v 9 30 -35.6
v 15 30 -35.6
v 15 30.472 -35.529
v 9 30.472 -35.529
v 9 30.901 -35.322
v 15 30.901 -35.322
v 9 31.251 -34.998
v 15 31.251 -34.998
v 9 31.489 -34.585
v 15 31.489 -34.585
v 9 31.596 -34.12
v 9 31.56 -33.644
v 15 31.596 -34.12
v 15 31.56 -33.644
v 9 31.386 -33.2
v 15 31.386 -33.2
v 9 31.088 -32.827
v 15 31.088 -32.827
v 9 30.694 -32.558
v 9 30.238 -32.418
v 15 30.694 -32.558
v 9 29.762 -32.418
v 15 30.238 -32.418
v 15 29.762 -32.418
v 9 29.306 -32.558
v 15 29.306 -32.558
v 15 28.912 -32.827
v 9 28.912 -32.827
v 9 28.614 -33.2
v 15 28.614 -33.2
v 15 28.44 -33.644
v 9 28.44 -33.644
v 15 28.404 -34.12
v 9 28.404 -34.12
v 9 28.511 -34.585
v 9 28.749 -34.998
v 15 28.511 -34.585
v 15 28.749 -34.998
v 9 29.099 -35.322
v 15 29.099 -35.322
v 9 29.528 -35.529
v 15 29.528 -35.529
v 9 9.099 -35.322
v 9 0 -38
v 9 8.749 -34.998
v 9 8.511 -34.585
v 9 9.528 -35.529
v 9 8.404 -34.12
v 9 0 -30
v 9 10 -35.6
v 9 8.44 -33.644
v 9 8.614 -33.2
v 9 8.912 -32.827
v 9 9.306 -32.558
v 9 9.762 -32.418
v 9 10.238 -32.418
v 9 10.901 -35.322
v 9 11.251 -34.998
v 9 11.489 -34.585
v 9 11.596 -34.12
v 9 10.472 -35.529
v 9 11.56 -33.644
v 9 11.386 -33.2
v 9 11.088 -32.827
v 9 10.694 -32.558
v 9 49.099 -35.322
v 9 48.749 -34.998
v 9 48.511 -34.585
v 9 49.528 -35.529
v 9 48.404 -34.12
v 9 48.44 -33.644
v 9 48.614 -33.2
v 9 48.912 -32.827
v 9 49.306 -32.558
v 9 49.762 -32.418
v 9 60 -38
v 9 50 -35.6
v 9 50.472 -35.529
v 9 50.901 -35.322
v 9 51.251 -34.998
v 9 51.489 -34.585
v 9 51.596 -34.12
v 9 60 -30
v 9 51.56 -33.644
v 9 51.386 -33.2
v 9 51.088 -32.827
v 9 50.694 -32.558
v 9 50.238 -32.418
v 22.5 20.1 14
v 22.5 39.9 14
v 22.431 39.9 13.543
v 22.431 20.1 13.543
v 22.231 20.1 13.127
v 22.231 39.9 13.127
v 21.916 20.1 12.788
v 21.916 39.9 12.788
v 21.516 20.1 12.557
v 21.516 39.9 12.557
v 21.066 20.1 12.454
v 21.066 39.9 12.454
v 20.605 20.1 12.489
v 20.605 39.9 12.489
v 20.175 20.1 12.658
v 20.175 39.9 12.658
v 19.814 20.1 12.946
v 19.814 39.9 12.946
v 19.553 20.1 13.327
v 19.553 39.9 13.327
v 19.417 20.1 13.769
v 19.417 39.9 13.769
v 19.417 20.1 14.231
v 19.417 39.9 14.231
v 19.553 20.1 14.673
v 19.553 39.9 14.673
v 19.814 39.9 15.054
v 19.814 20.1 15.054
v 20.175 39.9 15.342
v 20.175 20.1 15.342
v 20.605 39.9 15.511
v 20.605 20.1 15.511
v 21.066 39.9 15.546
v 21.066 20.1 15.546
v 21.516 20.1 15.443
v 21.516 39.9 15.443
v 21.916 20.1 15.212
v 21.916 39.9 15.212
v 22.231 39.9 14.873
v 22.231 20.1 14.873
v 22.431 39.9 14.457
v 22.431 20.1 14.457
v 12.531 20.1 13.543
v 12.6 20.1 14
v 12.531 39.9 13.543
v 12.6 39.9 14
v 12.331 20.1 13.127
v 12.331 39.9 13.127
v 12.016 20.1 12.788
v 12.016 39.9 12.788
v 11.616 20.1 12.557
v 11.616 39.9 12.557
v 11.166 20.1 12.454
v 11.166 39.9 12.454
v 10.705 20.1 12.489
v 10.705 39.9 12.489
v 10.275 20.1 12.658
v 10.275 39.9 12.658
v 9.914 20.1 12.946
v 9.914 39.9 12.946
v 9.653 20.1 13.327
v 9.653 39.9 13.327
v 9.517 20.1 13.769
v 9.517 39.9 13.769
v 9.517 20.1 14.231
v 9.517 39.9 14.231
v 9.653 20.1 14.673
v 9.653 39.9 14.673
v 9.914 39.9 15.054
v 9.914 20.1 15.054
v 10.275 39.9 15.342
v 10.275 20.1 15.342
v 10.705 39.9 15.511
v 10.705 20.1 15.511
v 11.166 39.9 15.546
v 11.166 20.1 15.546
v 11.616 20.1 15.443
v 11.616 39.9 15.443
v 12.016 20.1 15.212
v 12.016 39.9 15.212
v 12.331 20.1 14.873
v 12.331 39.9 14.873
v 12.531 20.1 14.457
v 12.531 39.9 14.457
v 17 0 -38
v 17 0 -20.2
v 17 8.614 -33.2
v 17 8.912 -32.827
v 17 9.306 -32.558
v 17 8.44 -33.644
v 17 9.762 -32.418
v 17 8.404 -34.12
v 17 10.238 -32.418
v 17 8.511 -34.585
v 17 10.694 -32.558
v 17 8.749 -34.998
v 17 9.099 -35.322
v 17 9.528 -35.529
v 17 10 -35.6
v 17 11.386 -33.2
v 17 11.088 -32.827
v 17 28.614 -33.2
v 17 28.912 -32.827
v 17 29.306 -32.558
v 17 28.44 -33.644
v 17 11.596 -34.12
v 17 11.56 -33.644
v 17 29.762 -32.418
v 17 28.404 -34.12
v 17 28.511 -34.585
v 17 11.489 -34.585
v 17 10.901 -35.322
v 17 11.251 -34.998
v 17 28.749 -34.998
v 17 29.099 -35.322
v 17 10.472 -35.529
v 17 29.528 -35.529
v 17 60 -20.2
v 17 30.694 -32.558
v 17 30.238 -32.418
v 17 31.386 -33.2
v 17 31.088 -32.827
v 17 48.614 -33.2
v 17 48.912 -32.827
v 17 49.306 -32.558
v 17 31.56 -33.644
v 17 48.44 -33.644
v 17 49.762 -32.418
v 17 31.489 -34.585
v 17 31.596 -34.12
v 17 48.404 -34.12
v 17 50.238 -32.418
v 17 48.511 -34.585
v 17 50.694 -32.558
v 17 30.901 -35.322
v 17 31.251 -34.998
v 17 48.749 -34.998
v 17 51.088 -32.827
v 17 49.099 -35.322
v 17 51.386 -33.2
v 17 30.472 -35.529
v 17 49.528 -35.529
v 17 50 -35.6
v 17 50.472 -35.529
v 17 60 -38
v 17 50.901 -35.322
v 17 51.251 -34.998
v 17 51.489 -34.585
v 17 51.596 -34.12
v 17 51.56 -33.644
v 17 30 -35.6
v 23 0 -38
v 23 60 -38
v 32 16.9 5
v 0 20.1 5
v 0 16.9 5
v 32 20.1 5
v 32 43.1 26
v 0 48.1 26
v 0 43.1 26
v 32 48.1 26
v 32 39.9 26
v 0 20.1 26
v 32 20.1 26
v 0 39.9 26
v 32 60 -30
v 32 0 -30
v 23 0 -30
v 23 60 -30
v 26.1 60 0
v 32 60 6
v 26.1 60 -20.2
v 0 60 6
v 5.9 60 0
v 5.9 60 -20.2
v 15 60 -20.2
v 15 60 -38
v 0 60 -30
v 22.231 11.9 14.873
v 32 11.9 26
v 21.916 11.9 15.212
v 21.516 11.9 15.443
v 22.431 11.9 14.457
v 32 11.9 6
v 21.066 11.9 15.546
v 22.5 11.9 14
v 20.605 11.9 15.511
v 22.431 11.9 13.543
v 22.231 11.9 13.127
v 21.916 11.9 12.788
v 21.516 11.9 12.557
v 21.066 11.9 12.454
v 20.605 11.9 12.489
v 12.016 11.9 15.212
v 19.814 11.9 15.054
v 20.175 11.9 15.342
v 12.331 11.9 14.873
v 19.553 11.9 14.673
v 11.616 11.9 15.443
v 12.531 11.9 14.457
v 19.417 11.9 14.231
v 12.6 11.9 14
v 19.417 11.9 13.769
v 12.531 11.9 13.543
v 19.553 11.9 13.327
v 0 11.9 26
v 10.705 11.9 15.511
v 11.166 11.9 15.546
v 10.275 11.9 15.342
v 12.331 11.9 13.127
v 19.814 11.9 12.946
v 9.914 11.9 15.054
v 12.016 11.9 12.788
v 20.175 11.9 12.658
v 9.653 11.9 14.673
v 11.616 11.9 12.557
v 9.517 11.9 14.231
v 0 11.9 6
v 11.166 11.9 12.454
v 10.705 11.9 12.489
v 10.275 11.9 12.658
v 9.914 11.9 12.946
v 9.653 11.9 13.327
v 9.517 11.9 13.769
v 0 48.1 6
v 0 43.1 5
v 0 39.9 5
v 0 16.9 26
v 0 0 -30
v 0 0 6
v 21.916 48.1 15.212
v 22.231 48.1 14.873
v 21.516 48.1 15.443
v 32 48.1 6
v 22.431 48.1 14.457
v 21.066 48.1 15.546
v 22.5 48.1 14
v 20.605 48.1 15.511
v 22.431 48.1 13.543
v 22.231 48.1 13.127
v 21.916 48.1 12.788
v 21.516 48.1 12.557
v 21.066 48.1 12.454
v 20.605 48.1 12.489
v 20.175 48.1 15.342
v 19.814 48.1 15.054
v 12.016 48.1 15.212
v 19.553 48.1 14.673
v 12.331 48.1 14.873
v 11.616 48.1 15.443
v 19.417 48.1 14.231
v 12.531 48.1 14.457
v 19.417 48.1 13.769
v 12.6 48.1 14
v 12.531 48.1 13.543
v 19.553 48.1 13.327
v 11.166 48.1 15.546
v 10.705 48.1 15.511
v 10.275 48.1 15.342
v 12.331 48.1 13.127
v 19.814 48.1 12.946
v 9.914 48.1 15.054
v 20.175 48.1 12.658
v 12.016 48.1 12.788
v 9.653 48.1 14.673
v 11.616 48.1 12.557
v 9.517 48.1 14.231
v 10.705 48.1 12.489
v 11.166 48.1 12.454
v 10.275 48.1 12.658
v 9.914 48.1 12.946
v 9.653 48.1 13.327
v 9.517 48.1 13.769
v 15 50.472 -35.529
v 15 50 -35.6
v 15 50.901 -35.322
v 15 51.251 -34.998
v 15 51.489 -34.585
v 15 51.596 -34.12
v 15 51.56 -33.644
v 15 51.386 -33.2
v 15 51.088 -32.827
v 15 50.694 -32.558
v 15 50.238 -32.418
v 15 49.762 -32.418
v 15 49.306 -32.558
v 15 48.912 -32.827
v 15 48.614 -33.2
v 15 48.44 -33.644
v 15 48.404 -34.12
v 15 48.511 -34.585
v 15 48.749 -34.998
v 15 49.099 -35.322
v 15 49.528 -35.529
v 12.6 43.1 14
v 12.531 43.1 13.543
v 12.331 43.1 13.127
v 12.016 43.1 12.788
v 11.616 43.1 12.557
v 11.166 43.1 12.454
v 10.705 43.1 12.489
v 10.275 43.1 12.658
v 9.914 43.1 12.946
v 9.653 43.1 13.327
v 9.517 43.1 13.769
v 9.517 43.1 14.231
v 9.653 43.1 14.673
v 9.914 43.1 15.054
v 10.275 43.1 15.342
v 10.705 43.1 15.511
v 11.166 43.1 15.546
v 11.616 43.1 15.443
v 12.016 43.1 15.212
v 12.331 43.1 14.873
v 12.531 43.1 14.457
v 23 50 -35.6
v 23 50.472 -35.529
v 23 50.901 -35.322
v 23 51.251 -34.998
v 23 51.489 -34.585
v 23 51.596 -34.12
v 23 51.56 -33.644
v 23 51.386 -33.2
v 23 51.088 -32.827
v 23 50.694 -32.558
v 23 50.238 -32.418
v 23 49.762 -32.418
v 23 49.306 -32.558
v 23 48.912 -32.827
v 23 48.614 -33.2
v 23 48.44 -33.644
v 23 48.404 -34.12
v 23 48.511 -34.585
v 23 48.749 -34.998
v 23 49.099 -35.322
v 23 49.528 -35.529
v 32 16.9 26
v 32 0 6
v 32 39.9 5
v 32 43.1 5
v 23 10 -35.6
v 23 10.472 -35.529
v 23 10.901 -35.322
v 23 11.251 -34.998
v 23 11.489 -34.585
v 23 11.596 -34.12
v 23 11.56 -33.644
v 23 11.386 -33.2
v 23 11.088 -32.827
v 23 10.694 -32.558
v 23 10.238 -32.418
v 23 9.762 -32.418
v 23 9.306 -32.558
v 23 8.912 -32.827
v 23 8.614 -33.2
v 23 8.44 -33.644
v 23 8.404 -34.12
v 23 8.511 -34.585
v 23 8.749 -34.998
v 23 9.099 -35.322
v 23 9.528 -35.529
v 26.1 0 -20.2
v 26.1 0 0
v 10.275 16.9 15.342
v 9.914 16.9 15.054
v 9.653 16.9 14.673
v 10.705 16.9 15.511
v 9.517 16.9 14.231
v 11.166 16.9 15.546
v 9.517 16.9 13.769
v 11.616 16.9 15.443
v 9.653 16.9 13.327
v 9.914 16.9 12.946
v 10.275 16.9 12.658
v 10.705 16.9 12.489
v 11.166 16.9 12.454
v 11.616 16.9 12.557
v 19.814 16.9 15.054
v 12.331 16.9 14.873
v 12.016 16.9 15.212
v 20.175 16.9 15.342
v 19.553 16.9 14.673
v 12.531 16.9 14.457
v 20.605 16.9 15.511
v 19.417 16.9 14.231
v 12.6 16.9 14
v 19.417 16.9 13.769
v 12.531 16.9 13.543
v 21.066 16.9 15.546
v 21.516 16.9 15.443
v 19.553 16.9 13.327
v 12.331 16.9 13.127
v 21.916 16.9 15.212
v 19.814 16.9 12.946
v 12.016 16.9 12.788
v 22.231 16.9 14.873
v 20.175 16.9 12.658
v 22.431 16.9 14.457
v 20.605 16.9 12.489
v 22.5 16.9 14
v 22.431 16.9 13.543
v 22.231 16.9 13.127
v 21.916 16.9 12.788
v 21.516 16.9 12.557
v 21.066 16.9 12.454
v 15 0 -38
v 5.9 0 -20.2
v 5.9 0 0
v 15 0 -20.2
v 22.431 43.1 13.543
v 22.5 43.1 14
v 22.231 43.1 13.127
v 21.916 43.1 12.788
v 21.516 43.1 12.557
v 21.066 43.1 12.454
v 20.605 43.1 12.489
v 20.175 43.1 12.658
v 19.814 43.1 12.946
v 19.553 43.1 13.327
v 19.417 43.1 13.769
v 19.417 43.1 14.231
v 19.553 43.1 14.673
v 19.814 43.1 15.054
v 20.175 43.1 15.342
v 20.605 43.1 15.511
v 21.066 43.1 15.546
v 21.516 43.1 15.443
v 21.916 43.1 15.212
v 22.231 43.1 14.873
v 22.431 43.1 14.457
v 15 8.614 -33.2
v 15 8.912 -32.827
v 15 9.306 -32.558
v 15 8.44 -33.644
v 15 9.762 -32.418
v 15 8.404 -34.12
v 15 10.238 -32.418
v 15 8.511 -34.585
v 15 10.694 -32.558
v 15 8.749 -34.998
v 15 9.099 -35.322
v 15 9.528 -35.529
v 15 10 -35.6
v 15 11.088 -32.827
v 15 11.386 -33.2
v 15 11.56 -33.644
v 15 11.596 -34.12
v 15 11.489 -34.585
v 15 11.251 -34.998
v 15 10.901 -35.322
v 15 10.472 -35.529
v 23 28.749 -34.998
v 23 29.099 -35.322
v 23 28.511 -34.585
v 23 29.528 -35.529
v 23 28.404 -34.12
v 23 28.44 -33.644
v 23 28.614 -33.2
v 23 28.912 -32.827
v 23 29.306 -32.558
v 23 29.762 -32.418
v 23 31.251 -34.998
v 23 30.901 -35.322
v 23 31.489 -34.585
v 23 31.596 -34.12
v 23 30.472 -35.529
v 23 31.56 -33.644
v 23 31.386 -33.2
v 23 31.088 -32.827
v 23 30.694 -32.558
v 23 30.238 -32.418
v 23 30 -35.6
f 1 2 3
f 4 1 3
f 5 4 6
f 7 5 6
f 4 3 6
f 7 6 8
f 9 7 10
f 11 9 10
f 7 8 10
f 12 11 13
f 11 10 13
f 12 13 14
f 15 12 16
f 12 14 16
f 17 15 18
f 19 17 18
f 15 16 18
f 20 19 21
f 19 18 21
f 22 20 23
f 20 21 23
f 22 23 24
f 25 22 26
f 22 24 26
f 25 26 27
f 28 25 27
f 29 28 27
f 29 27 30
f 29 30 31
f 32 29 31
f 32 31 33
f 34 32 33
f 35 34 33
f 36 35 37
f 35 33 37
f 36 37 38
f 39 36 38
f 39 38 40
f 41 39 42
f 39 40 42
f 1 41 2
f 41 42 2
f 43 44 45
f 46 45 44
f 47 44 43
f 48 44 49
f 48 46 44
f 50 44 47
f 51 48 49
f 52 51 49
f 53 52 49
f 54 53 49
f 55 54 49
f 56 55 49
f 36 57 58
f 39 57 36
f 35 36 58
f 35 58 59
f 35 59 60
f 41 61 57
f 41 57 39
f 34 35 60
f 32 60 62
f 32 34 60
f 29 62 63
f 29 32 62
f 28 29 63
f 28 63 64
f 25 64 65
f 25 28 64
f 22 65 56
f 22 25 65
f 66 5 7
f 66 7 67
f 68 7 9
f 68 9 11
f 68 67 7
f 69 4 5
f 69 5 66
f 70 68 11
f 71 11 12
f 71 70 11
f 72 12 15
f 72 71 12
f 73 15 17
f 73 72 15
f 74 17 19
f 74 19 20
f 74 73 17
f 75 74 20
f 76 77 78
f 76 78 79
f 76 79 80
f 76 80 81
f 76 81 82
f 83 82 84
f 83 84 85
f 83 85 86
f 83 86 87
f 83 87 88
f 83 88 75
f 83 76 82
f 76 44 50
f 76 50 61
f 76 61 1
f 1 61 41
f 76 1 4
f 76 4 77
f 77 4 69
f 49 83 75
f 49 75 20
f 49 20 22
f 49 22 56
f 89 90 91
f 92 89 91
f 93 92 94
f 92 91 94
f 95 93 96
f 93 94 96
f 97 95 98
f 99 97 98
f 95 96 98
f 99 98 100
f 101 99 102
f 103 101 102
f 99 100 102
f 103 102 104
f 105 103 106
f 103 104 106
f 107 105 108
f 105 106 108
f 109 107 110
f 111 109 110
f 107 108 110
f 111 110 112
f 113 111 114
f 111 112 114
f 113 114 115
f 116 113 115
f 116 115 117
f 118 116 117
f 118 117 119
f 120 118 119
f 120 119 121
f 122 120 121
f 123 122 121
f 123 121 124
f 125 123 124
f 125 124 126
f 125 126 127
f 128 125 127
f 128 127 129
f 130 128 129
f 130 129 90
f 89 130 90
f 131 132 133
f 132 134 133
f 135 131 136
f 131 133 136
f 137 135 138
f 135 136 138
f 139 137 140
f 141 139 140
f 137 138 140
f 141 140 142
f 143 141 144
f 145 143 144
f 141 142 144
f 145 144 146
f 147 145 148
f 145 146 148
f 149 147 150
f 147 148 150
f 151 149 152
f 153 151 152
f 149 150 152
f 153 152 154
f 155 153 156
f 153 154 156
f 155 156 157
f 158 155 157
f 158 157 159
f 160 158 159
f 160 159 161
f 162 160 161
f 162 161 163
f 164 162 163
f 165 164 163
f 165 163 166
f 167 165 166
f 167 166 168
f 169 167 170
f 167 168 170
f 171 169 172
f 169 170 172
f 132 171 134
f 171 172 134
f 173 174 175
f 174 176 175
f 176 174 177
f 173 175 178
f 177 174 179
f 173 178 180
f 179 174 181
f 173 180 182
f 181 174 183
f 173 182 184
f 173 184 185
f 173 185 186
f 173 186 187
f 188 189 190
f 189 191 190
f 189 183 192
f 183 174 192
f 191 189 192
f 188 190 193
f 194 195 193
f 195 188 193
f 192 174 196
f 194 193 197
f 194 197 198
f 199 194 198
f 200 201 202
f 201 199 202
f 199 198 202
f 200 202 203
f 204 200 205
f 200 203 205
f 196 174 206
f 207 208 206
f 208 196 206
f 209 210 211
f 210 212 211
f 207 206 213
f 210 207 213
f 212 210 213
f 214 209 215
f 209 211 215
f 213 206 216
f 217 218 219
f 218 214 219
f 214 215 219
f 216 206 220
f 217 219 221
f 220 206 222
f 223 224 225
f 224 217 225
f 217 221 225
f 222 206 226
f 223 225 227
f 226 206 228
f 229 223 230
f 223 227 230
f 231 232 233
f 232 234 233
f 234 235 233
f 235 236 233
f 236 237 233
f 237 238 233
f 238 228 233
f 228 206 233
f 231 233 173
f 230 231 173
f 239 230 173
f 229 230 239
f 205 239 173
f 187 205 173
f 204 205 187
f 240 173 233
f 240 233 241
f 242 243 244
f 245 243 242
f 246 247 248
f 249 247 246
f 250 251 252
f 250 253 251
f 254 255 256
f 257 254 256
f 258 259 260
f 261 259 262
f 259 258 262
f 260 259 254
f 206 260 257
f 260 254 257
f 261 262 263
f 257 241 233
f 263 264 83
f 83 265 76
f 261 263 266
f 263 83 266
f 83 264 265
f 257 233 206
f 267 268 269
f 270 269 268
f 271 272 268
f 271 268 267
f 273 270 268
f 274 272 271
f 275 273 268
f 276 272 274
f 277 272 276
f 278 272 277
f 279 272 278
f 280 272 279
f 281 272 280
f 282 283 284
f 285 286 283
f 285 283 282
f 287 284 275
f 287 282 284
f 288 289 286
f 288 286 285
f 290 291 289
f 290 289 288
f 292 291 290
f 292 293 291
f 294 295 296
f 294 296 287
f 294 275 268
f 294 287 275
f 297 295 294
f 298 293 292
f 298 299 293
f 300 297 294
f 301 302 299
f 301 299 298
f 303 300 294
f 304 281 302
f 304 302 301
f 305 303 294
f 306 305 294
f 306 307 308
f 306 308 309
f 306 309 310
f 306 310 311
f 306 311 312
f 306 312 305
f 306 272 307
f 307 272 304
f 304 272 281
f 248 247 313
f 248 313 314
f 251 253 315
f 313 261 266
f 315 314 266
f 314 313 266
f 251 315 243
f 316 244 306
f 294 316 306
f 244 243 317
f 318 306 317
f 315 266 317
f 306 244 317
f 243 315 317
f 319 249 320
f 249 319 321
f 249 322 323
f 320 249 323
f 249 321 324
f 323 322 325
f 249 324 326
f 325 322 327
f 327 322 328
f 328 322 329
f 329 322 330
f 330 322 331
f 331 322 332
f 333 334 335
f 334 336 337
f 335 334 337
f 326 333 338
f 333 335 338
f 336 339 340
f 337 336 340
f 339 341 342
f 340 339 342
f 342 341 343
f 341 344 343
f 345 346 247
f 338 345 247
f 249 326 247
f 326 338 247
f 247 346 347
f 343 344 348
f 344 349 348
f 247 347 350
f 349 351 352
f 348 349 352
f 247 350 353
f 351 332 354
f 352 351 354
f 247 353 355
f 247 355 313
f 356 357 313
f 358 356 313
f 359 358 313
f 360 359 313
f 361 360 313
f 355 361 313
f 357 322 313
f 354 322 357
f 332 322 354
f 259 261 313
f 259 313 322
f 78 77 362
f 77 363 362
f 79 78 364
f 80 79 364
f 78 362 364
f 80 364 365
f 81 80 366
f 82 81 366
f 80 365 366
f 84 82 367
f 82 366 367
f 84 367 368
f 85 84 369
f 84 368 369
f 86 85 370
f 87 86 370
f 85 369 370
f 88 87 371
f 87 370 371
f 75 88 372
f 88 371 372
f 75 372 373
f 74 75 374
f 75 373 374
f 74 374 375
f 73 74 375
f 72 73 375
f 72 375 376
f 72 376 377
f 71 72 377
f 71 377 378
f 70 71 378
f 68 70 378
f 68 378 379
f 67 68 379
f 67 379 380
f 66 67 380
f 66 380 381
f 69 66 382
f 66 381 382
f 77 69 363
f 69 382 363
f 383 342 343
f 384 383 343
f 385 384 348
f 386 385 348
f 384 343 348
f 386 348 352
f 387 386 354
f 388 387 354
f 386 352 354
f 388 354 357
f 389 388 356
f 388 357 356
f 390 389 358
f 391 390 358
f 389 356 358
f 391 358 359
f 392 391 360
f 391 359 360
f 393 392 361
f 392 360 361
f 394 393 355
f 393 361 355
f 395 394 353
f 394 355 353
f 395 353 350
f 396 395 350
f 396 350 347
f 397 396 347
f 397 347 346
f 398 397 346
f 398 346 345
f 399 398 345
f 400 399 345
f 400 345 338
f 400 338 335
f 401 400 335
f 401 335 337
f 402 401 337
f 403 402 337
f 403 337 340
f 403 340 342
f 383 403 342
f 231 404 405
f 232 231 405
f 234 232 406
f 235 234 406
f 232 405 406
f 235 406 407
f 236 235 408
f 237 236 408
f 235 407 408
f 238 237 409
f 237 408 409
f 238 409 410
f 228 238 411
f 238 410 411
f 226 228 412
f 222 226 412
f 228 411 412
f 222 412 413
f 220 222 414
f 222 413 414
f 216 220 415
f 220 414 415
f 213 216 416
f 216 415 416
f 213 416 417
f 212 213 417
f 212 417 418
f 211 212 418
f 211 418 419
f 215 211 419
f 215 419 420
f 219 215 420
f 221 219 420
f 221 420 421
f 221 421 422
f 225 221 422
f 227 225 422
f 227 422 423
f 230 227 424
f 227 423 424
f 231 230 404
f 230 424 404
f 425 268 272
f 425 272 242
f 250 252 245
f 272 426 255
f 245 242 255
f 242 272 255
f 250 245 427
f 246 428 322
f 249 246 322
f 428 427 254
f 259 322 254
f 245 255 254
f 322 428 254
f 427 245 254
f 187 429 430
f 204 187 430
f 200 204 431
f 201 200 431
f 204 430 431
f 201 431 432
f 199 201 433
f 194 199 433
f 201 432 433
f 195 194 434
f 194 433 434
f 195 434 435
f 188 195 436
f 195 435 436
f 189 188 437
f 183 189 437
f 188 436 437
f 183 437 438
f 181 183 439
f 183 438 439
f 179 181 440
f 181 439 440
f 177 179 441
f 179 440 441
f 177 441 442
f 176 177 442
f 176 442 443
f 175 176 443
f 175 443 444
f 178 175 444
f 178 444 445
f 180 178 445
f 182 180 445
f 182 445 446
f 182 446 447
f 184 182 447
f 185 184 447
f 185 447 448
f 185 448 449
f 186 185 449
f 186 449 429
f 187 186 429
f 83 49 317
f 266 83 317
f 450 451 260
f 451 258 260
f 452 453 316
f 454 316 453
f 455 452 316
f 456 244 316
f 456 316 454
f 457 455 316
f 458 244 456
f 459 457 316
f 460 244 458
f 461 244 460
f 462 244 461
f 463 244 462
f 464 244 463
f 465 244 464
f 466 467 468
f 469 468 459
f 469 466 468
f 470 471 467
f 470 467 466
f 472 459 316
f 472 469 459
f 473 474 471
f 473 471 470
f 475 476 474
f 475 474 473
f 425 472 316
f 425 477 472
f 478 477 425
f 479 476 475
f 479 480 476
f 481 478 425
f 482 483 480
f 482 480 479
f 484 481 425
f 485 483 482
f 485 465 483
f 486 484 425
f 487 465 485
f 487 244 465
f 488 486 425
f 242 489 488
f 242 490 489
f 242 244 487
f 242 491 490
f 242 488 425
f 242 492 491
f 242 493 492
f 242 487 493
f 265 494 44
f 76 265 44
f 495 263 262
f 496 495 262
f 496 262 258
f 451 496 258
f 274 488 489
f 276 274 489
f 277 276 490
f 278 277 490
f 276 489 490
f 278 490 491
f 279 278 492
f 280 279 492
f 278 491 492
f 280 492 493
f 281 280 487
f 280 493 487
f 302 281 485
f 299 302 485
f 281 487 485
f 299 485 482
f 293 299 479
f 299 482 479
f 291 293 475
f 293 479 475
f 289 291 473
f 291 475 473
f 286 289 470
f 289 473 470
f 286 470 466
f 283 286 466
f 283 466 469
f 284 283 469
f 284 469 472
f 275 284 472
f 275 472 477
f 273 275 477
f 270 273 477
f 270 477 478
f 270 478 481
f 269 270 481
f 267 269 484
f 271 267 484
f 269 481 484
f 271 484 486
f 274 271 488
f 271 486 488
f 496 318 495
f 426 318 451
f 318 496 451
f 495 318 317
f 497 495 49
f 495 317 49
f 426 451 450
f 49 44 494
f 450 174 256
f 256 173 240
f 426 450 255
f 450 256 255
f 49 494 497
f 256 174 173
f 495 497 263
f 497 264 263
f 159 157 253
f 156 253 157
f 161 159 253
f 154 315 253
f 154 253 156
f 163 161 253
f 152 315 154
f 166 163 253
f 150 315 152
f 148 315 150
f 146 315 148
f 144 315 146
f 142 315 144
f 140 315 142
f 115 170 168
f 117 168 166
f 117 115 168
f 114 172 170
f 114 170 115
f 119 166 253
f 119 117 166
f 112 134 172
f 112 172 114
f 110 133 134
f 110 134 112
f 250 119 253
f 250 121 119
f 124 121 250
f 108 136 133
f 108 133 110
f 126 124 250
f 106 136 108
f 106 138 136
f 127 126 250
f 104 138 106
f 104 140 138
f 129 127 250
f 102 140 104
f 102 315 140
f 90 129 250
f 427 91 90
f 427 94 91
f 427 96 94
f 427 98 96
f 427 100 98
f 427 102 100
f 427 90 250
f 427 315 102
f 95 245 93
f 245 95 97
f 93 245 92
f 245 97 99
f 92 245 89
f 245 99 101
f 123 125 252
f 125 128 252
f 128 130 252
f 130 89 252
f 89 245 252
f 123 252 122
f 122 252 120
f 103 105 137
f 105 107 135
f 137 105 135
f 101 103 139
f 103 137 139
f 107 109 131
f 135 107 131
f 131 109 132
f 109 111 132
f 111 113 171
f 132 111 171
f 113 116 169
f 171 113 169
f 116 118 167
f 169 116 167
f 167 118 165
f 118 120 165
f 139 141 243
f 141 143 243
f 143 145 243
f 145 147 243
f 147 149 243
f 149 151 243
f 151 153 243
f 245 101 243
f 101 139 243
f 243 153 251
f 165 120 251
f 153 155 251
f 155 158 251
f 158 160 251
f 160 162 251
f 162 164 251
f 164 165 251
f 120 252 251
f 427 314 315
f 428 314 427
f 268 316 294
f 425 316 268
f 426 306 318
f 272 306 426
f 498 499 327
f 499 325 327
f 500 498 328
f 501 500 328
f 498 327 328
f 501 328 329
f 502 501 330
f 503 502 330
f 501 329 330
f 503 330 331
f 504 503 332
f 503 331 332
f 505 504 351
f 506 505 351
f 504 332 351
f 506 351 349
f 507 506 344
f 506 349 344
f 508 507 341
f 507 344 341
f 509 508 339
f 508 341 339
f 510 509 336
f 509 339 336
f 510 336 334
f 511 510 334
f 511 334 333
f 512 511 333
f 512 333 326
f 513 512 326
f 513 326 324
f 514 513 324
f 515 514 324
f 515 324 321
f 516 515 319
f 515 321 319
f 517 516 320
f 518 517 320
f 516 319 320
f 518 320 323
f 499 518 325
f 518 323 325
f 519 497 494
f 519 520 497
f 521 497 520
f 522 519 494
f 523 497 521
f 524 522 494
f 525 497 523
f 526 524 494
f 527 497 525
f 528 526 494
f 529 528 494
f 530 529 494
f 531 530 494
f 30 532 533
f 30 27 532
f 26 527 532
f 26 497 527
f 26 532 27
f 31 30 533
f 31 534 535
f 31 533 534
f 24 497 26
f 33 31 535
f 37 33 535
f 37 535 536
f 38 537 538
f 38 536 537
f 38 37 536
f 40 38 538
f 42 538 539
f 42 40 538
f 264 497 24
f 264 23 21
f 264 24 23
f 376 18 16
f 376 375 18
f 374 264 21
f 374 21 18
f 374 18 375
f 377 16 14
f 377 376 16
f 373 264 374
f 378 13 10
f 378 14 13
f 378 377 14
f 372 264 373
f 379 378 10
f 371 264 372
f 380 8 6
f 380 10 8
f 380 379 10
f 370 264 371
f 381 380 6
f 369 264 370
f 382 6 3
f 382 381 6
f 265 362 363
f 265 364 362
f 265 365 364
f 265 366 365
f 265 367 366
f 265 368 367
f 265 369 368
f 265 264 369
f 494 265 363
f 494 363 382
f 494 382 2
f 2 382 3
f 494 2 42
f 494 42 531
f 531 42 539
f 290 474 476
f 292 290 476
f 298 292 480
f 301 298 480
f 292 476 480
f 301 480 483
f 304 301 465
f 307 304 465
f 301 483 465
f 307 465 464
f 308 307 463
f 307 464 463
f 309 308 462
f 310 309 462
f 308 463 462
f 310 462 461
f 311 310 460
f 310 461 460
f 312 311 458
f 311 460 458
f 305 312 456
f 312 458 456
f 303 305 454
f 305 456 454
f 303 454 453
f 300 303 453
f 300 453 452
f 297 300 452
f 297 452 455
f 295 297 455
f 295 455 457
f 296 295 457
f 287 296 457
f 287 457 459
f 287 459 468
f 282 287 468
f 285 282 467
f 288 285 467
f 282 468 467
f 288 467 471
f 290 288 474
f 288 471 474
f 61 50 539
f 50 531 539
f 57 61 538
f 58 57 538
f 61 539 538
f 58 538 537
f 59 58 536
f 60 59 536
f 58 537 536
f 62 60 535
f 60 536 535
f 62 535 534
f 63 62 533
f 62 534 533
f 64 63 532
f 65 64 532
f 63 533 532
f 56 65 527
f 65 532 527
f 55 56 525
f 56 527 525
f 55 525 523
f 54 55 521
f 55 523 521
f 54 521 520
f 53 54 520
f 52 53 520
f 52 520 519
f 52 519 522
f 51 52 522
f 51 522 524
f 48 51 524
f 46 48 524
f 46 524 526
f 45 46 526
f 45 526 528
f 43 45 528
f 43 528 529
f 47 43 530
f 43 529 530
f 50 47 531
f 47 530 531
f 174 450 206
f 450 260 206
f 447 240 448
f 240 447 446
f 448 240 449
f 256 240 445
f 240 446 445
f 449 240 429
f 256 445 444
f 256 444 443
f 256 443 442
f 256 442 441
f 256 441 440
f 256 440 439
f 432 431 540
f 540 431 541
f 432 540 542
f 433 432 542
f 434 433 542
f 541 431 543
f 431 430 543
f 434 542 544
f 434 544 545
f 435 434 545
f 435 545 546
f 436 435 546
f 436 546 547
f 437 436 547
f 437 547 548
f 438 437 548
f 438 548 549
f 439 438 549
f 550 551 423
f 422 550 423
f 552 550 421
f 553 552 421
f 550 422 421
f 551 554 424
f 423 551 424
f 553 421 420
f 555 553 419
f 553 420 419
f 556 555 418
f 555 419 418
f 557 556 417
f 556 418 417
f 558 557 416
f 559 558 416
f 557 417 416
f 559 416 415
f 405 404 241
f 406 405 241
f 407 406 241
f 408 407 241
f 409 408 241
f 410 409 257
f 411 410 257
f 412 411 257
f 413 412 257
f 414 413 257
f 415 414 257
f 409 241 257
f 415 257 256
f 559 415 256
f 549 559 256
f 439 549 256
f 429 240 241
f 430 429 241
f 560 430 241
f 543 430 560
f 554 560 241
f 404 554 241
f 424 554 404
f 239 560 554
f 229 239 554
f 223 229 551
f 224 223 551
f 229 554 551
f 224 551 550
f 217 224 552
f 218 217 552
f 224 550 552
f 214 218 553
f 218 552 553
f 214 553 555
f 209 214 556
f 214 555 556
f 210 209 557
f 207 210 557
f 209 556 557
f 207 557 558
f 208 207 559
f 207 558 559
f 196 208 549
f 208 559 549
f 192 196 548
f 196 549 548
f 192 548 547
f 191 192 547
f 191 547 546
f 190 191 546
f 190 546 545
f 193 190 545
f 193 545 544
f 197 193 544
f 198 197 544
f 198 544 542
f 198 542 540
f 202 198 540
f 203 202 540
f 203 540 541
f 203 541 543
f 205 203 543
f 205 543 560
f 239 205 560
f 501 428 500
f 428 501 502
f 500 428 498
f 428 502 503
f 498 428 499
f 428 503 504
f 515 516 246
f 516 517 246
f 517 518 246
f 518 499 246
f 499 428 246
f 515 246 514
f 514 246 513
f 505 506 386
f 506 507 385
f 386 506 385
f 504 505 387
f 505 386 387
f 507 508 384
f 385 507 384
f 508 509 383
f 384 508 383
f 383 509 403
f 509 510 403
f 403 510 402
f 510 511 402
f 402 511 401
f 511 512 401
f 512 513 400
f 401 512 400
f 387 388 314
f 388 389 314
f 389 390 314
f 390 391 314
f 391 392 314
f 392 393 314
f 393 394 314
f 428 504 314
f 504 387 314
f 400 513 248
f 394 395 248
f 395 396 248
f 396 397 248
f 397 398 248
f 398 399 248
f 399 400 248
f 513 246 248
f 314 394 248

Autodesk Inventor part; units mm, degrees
ref_plane "YZ Plane" through (0, 0, 0) normal (1, 0, 0) x (0, 1, 0)
ref_plane "XZ Plane" through (0, 0, 0) normal (0, 1, 0) x (-1, 0, 0)
ref_plane "XY Plane" through (0, 0, 0) normal (0, 0, 1) x (1, 0, 0)
sketch "Sketch1" plane through (0, 0, 0) normal (0, 0, 1) x (1, 0, 0)
  line L0 (0, 0) -> (32, 0)
  line L1 (32, 0) -> (32, 60)
  line L2 (32, 60) -> (0, 60)
  line L3 (0, 60) -> (0, 0)
  dimension "d0" = 32
  dimension "d1" = 60
extrude "Extrusion1" add sketch "Sketch1" along normal blind 6
sketch "Sketch3" plane through (0, 0, 6) normal (0, 0, 1) x (1, 0, 0)
  line L0 (32, 0) -> (32, 60) projected
  line L1 (32, 60) -> (0, 60) projected
  line L2 (0, 60) -> (0, 0) projected
  line L3 (0, 0) -> (32, 0) projected
  line L4 (0, 30) -> (32, 30) construction
  line L5 (32, 0) -> (32, 60) construction
  line L6 (0, 60) -> (0, 0) projected
  line L7 (0, 39.9) -> (32, 39.9)
  line L8 (32, 39.9) -> (32, 20.1)
  line L9 (32, 20.1) -> (0, 20.1)
  line L10 (0, 20.1) -> (0, 39.9)
  line L11 (0, 43.1) -> (32, 43.1)
  line L12 (32, 43.1) -> (32, 48.1)
  line L13 (32, 48.1) -> (0, 48.1)
  line L14 (0, 48.1) -> (0, 43.1)
  line L15 (0, 16.9) -> (32, 16.9)
  line L16 (32, 16.9) -> (32, 11.9)
  line L17 (32, 11.9) -> (0, 11.9)
  line L18 (0, 11.9) -> (0, 16.9)
  point P0 (0, 11.9)
  point P1 (0, 20.1)
  point P2 (0, 48.1)
  point P3 (0, 43.1)
  dimension "d6" = 30
  dimension "d7" = 60
  dimension "d8" = 9.9
  dimension "d9" = 9.9
  dimension "d10" = 5
  dimension "d11" = 3.2
  dimension "d12" = 3.2
  dimension "d13" = 5
extrude "Extrusion2" add sketch "Sketch3" along normal blind 20 contours L17 L2 L15 L0 | L9 L2 L7 L0 | L11 L2 L13 L0
sketch "Sketch4" plane through (0, 48.1, 6) normal (0, 1, 0) x (1, 0, 0)
  line L0 (0, 0) -> (32, 0) projected
  line L1 (0, 0) -> (0, -20) projected
  line L2 (32, -20) -> (0, -20) projected
  line L3 (32, 0) -> (32, -20) projected
  circle A0 centre (11.05, -8) radius 1.55
  circle A1 centre (20.95, -8) radius 1.55
  line L4 (0, -20) -> (32, -20) construction
  line L5 (16, -20) -> (16, 0) construction
  point P0 (0, 6)
  dimension "d16" = 3.1
  dimension "d17" = 3.1
  dimension "d18" = 4.95
  dimension "d19" = 4.95
  dimension "d20" = 8
  dimension "d21" = 8
extrude "Extrusion3" cut sketch "Sketch4" against normal blind 100 contours A0 | A1
ref_plane "Work Plane1" through (16, 0, 0) normal (1, 0, 0) x (0, 0, -1)
ref_plane "Work Plane3" through (0, 30, 6) normal (0, 1, 0) x (1, 0, 0)
sketch "Sketch14" plane through (0, 60, 0) normal (0, 1, 0) x (1, 0, 0)
  line L0 (32, 0) -> (0, 0) projected
  line L1 (5.9, 0) -> (26.1, 0)
  line L2 (26.1, 0) -> (26.1, 20.2)
  line L3 (26.1, 20.2) -> (5.9, 20.2)
  line L4 (5.9, 20.2) -> (5.9, 0)
  line L5 (0, 0) -> (32, 0)
  line L6 (32, 0) -> (32, 30)
  line L7 (32, 30) -> (0, 30)
  line L8 (0, 30) -> (0, 0)
  line L9 (32, 0) -> (32, -6) projected
  line L10 (9, 20.2) -> (15, 20.2)
  line L11 (15, 20.2) -> (15, 38)
  line L12 (15, 38) -> (9, 38)
  line L13 (9, 38) -> (9, 20.2)
  line L14 (23, 20.2) -> (17, 20.2)
  line L15 (17, 20.2) -> (17, 38)
  line L16 (17, 38) -> (23, 38)
  line L17 (23, 38) -> (23, 20.2)
  line L18 (16, 46) -> (16, -38) projected
  point P0 (23, 30)
  point P1 (9, 30)
  dimension "d74" = 20.2
  dimension "d75" = 20.2
  dimension "d76" = 30
  dimension "d77" = 5.9
  dimension "d78" = 32
  dimension "d79" = 1
  dimension "d80" = 1
  dimension "d81" = 6
  dimension "d82" = 6
  dimension "d83" = 8
  dimension "d85" = 8
extrude "Extrusion12" add sketch "Sketch14" against normal blind 60 contours L0 L2 L3 L17 L7 L6 | L17 L3 L15 L7 | L7 L15 L16 L17 | L0 L8 L7 L13 L3 L4 | L3 L13 L7 L11 | L7 L13 L12 L11
sketch "Sketch15" plane through (23, 60, -30) normal (1, 0, 0) x (0, 0, -1)
  circle A0 centre (4, -10) radius 1.6
  circle A1 centre (4, -30) radius 1.6
  circle A2 centre (4, -50) radius 1.6
  line L0 (8, -60) -> (0, -60) projected
  line L1 (0, 0) -> (8, 0) projected
  line L2 (8, 0) -> (8, -60) projected
  point P0 (-30, -60)
  dimension "d88" = 3.2
  dimension "d89" = 3.2
  dimension "d90" = 3.2
  dimension "d91" = 10
  dimension "d92" = 10
  dimension "d93" = 30
  dimension "d94" = 4
extrude "Extrusion13" cut sketch "Sketch15" against normal blind 60
sketch "Sketch16" plane through (0, 0, 6) normal (0, 0, 1) x (1, 0, 0)
  line L0 (0, 39.9) -> (32, 39.9) projected
  line L1 (32, 39.9) -> (32, 43.1) projected
  line L2 (32, 43.1) -> (0, 43.1) projected
  line L3 (0, 43.1) -> (0, 39.9) projected
  line L4 (0, 16.9) -> (32, 16.9) projected
  line L5 (32, 16.9) -> (32, 20.1) projected
  line L6 (32, 20.1) -> (0, 20.1) projected
  line L7 (0, 20.1) -> (0, 16.9) projected
  point P0 (0, 0)
extrude "Extrusion14" cut sketch "Sketch16" against normal blind 1
equation "\"d6\" = 0.5 * d7"
equation "\"d77\" = -0.5 * d74 + 0.5 * d78"
properties part number "Drone_mount"
